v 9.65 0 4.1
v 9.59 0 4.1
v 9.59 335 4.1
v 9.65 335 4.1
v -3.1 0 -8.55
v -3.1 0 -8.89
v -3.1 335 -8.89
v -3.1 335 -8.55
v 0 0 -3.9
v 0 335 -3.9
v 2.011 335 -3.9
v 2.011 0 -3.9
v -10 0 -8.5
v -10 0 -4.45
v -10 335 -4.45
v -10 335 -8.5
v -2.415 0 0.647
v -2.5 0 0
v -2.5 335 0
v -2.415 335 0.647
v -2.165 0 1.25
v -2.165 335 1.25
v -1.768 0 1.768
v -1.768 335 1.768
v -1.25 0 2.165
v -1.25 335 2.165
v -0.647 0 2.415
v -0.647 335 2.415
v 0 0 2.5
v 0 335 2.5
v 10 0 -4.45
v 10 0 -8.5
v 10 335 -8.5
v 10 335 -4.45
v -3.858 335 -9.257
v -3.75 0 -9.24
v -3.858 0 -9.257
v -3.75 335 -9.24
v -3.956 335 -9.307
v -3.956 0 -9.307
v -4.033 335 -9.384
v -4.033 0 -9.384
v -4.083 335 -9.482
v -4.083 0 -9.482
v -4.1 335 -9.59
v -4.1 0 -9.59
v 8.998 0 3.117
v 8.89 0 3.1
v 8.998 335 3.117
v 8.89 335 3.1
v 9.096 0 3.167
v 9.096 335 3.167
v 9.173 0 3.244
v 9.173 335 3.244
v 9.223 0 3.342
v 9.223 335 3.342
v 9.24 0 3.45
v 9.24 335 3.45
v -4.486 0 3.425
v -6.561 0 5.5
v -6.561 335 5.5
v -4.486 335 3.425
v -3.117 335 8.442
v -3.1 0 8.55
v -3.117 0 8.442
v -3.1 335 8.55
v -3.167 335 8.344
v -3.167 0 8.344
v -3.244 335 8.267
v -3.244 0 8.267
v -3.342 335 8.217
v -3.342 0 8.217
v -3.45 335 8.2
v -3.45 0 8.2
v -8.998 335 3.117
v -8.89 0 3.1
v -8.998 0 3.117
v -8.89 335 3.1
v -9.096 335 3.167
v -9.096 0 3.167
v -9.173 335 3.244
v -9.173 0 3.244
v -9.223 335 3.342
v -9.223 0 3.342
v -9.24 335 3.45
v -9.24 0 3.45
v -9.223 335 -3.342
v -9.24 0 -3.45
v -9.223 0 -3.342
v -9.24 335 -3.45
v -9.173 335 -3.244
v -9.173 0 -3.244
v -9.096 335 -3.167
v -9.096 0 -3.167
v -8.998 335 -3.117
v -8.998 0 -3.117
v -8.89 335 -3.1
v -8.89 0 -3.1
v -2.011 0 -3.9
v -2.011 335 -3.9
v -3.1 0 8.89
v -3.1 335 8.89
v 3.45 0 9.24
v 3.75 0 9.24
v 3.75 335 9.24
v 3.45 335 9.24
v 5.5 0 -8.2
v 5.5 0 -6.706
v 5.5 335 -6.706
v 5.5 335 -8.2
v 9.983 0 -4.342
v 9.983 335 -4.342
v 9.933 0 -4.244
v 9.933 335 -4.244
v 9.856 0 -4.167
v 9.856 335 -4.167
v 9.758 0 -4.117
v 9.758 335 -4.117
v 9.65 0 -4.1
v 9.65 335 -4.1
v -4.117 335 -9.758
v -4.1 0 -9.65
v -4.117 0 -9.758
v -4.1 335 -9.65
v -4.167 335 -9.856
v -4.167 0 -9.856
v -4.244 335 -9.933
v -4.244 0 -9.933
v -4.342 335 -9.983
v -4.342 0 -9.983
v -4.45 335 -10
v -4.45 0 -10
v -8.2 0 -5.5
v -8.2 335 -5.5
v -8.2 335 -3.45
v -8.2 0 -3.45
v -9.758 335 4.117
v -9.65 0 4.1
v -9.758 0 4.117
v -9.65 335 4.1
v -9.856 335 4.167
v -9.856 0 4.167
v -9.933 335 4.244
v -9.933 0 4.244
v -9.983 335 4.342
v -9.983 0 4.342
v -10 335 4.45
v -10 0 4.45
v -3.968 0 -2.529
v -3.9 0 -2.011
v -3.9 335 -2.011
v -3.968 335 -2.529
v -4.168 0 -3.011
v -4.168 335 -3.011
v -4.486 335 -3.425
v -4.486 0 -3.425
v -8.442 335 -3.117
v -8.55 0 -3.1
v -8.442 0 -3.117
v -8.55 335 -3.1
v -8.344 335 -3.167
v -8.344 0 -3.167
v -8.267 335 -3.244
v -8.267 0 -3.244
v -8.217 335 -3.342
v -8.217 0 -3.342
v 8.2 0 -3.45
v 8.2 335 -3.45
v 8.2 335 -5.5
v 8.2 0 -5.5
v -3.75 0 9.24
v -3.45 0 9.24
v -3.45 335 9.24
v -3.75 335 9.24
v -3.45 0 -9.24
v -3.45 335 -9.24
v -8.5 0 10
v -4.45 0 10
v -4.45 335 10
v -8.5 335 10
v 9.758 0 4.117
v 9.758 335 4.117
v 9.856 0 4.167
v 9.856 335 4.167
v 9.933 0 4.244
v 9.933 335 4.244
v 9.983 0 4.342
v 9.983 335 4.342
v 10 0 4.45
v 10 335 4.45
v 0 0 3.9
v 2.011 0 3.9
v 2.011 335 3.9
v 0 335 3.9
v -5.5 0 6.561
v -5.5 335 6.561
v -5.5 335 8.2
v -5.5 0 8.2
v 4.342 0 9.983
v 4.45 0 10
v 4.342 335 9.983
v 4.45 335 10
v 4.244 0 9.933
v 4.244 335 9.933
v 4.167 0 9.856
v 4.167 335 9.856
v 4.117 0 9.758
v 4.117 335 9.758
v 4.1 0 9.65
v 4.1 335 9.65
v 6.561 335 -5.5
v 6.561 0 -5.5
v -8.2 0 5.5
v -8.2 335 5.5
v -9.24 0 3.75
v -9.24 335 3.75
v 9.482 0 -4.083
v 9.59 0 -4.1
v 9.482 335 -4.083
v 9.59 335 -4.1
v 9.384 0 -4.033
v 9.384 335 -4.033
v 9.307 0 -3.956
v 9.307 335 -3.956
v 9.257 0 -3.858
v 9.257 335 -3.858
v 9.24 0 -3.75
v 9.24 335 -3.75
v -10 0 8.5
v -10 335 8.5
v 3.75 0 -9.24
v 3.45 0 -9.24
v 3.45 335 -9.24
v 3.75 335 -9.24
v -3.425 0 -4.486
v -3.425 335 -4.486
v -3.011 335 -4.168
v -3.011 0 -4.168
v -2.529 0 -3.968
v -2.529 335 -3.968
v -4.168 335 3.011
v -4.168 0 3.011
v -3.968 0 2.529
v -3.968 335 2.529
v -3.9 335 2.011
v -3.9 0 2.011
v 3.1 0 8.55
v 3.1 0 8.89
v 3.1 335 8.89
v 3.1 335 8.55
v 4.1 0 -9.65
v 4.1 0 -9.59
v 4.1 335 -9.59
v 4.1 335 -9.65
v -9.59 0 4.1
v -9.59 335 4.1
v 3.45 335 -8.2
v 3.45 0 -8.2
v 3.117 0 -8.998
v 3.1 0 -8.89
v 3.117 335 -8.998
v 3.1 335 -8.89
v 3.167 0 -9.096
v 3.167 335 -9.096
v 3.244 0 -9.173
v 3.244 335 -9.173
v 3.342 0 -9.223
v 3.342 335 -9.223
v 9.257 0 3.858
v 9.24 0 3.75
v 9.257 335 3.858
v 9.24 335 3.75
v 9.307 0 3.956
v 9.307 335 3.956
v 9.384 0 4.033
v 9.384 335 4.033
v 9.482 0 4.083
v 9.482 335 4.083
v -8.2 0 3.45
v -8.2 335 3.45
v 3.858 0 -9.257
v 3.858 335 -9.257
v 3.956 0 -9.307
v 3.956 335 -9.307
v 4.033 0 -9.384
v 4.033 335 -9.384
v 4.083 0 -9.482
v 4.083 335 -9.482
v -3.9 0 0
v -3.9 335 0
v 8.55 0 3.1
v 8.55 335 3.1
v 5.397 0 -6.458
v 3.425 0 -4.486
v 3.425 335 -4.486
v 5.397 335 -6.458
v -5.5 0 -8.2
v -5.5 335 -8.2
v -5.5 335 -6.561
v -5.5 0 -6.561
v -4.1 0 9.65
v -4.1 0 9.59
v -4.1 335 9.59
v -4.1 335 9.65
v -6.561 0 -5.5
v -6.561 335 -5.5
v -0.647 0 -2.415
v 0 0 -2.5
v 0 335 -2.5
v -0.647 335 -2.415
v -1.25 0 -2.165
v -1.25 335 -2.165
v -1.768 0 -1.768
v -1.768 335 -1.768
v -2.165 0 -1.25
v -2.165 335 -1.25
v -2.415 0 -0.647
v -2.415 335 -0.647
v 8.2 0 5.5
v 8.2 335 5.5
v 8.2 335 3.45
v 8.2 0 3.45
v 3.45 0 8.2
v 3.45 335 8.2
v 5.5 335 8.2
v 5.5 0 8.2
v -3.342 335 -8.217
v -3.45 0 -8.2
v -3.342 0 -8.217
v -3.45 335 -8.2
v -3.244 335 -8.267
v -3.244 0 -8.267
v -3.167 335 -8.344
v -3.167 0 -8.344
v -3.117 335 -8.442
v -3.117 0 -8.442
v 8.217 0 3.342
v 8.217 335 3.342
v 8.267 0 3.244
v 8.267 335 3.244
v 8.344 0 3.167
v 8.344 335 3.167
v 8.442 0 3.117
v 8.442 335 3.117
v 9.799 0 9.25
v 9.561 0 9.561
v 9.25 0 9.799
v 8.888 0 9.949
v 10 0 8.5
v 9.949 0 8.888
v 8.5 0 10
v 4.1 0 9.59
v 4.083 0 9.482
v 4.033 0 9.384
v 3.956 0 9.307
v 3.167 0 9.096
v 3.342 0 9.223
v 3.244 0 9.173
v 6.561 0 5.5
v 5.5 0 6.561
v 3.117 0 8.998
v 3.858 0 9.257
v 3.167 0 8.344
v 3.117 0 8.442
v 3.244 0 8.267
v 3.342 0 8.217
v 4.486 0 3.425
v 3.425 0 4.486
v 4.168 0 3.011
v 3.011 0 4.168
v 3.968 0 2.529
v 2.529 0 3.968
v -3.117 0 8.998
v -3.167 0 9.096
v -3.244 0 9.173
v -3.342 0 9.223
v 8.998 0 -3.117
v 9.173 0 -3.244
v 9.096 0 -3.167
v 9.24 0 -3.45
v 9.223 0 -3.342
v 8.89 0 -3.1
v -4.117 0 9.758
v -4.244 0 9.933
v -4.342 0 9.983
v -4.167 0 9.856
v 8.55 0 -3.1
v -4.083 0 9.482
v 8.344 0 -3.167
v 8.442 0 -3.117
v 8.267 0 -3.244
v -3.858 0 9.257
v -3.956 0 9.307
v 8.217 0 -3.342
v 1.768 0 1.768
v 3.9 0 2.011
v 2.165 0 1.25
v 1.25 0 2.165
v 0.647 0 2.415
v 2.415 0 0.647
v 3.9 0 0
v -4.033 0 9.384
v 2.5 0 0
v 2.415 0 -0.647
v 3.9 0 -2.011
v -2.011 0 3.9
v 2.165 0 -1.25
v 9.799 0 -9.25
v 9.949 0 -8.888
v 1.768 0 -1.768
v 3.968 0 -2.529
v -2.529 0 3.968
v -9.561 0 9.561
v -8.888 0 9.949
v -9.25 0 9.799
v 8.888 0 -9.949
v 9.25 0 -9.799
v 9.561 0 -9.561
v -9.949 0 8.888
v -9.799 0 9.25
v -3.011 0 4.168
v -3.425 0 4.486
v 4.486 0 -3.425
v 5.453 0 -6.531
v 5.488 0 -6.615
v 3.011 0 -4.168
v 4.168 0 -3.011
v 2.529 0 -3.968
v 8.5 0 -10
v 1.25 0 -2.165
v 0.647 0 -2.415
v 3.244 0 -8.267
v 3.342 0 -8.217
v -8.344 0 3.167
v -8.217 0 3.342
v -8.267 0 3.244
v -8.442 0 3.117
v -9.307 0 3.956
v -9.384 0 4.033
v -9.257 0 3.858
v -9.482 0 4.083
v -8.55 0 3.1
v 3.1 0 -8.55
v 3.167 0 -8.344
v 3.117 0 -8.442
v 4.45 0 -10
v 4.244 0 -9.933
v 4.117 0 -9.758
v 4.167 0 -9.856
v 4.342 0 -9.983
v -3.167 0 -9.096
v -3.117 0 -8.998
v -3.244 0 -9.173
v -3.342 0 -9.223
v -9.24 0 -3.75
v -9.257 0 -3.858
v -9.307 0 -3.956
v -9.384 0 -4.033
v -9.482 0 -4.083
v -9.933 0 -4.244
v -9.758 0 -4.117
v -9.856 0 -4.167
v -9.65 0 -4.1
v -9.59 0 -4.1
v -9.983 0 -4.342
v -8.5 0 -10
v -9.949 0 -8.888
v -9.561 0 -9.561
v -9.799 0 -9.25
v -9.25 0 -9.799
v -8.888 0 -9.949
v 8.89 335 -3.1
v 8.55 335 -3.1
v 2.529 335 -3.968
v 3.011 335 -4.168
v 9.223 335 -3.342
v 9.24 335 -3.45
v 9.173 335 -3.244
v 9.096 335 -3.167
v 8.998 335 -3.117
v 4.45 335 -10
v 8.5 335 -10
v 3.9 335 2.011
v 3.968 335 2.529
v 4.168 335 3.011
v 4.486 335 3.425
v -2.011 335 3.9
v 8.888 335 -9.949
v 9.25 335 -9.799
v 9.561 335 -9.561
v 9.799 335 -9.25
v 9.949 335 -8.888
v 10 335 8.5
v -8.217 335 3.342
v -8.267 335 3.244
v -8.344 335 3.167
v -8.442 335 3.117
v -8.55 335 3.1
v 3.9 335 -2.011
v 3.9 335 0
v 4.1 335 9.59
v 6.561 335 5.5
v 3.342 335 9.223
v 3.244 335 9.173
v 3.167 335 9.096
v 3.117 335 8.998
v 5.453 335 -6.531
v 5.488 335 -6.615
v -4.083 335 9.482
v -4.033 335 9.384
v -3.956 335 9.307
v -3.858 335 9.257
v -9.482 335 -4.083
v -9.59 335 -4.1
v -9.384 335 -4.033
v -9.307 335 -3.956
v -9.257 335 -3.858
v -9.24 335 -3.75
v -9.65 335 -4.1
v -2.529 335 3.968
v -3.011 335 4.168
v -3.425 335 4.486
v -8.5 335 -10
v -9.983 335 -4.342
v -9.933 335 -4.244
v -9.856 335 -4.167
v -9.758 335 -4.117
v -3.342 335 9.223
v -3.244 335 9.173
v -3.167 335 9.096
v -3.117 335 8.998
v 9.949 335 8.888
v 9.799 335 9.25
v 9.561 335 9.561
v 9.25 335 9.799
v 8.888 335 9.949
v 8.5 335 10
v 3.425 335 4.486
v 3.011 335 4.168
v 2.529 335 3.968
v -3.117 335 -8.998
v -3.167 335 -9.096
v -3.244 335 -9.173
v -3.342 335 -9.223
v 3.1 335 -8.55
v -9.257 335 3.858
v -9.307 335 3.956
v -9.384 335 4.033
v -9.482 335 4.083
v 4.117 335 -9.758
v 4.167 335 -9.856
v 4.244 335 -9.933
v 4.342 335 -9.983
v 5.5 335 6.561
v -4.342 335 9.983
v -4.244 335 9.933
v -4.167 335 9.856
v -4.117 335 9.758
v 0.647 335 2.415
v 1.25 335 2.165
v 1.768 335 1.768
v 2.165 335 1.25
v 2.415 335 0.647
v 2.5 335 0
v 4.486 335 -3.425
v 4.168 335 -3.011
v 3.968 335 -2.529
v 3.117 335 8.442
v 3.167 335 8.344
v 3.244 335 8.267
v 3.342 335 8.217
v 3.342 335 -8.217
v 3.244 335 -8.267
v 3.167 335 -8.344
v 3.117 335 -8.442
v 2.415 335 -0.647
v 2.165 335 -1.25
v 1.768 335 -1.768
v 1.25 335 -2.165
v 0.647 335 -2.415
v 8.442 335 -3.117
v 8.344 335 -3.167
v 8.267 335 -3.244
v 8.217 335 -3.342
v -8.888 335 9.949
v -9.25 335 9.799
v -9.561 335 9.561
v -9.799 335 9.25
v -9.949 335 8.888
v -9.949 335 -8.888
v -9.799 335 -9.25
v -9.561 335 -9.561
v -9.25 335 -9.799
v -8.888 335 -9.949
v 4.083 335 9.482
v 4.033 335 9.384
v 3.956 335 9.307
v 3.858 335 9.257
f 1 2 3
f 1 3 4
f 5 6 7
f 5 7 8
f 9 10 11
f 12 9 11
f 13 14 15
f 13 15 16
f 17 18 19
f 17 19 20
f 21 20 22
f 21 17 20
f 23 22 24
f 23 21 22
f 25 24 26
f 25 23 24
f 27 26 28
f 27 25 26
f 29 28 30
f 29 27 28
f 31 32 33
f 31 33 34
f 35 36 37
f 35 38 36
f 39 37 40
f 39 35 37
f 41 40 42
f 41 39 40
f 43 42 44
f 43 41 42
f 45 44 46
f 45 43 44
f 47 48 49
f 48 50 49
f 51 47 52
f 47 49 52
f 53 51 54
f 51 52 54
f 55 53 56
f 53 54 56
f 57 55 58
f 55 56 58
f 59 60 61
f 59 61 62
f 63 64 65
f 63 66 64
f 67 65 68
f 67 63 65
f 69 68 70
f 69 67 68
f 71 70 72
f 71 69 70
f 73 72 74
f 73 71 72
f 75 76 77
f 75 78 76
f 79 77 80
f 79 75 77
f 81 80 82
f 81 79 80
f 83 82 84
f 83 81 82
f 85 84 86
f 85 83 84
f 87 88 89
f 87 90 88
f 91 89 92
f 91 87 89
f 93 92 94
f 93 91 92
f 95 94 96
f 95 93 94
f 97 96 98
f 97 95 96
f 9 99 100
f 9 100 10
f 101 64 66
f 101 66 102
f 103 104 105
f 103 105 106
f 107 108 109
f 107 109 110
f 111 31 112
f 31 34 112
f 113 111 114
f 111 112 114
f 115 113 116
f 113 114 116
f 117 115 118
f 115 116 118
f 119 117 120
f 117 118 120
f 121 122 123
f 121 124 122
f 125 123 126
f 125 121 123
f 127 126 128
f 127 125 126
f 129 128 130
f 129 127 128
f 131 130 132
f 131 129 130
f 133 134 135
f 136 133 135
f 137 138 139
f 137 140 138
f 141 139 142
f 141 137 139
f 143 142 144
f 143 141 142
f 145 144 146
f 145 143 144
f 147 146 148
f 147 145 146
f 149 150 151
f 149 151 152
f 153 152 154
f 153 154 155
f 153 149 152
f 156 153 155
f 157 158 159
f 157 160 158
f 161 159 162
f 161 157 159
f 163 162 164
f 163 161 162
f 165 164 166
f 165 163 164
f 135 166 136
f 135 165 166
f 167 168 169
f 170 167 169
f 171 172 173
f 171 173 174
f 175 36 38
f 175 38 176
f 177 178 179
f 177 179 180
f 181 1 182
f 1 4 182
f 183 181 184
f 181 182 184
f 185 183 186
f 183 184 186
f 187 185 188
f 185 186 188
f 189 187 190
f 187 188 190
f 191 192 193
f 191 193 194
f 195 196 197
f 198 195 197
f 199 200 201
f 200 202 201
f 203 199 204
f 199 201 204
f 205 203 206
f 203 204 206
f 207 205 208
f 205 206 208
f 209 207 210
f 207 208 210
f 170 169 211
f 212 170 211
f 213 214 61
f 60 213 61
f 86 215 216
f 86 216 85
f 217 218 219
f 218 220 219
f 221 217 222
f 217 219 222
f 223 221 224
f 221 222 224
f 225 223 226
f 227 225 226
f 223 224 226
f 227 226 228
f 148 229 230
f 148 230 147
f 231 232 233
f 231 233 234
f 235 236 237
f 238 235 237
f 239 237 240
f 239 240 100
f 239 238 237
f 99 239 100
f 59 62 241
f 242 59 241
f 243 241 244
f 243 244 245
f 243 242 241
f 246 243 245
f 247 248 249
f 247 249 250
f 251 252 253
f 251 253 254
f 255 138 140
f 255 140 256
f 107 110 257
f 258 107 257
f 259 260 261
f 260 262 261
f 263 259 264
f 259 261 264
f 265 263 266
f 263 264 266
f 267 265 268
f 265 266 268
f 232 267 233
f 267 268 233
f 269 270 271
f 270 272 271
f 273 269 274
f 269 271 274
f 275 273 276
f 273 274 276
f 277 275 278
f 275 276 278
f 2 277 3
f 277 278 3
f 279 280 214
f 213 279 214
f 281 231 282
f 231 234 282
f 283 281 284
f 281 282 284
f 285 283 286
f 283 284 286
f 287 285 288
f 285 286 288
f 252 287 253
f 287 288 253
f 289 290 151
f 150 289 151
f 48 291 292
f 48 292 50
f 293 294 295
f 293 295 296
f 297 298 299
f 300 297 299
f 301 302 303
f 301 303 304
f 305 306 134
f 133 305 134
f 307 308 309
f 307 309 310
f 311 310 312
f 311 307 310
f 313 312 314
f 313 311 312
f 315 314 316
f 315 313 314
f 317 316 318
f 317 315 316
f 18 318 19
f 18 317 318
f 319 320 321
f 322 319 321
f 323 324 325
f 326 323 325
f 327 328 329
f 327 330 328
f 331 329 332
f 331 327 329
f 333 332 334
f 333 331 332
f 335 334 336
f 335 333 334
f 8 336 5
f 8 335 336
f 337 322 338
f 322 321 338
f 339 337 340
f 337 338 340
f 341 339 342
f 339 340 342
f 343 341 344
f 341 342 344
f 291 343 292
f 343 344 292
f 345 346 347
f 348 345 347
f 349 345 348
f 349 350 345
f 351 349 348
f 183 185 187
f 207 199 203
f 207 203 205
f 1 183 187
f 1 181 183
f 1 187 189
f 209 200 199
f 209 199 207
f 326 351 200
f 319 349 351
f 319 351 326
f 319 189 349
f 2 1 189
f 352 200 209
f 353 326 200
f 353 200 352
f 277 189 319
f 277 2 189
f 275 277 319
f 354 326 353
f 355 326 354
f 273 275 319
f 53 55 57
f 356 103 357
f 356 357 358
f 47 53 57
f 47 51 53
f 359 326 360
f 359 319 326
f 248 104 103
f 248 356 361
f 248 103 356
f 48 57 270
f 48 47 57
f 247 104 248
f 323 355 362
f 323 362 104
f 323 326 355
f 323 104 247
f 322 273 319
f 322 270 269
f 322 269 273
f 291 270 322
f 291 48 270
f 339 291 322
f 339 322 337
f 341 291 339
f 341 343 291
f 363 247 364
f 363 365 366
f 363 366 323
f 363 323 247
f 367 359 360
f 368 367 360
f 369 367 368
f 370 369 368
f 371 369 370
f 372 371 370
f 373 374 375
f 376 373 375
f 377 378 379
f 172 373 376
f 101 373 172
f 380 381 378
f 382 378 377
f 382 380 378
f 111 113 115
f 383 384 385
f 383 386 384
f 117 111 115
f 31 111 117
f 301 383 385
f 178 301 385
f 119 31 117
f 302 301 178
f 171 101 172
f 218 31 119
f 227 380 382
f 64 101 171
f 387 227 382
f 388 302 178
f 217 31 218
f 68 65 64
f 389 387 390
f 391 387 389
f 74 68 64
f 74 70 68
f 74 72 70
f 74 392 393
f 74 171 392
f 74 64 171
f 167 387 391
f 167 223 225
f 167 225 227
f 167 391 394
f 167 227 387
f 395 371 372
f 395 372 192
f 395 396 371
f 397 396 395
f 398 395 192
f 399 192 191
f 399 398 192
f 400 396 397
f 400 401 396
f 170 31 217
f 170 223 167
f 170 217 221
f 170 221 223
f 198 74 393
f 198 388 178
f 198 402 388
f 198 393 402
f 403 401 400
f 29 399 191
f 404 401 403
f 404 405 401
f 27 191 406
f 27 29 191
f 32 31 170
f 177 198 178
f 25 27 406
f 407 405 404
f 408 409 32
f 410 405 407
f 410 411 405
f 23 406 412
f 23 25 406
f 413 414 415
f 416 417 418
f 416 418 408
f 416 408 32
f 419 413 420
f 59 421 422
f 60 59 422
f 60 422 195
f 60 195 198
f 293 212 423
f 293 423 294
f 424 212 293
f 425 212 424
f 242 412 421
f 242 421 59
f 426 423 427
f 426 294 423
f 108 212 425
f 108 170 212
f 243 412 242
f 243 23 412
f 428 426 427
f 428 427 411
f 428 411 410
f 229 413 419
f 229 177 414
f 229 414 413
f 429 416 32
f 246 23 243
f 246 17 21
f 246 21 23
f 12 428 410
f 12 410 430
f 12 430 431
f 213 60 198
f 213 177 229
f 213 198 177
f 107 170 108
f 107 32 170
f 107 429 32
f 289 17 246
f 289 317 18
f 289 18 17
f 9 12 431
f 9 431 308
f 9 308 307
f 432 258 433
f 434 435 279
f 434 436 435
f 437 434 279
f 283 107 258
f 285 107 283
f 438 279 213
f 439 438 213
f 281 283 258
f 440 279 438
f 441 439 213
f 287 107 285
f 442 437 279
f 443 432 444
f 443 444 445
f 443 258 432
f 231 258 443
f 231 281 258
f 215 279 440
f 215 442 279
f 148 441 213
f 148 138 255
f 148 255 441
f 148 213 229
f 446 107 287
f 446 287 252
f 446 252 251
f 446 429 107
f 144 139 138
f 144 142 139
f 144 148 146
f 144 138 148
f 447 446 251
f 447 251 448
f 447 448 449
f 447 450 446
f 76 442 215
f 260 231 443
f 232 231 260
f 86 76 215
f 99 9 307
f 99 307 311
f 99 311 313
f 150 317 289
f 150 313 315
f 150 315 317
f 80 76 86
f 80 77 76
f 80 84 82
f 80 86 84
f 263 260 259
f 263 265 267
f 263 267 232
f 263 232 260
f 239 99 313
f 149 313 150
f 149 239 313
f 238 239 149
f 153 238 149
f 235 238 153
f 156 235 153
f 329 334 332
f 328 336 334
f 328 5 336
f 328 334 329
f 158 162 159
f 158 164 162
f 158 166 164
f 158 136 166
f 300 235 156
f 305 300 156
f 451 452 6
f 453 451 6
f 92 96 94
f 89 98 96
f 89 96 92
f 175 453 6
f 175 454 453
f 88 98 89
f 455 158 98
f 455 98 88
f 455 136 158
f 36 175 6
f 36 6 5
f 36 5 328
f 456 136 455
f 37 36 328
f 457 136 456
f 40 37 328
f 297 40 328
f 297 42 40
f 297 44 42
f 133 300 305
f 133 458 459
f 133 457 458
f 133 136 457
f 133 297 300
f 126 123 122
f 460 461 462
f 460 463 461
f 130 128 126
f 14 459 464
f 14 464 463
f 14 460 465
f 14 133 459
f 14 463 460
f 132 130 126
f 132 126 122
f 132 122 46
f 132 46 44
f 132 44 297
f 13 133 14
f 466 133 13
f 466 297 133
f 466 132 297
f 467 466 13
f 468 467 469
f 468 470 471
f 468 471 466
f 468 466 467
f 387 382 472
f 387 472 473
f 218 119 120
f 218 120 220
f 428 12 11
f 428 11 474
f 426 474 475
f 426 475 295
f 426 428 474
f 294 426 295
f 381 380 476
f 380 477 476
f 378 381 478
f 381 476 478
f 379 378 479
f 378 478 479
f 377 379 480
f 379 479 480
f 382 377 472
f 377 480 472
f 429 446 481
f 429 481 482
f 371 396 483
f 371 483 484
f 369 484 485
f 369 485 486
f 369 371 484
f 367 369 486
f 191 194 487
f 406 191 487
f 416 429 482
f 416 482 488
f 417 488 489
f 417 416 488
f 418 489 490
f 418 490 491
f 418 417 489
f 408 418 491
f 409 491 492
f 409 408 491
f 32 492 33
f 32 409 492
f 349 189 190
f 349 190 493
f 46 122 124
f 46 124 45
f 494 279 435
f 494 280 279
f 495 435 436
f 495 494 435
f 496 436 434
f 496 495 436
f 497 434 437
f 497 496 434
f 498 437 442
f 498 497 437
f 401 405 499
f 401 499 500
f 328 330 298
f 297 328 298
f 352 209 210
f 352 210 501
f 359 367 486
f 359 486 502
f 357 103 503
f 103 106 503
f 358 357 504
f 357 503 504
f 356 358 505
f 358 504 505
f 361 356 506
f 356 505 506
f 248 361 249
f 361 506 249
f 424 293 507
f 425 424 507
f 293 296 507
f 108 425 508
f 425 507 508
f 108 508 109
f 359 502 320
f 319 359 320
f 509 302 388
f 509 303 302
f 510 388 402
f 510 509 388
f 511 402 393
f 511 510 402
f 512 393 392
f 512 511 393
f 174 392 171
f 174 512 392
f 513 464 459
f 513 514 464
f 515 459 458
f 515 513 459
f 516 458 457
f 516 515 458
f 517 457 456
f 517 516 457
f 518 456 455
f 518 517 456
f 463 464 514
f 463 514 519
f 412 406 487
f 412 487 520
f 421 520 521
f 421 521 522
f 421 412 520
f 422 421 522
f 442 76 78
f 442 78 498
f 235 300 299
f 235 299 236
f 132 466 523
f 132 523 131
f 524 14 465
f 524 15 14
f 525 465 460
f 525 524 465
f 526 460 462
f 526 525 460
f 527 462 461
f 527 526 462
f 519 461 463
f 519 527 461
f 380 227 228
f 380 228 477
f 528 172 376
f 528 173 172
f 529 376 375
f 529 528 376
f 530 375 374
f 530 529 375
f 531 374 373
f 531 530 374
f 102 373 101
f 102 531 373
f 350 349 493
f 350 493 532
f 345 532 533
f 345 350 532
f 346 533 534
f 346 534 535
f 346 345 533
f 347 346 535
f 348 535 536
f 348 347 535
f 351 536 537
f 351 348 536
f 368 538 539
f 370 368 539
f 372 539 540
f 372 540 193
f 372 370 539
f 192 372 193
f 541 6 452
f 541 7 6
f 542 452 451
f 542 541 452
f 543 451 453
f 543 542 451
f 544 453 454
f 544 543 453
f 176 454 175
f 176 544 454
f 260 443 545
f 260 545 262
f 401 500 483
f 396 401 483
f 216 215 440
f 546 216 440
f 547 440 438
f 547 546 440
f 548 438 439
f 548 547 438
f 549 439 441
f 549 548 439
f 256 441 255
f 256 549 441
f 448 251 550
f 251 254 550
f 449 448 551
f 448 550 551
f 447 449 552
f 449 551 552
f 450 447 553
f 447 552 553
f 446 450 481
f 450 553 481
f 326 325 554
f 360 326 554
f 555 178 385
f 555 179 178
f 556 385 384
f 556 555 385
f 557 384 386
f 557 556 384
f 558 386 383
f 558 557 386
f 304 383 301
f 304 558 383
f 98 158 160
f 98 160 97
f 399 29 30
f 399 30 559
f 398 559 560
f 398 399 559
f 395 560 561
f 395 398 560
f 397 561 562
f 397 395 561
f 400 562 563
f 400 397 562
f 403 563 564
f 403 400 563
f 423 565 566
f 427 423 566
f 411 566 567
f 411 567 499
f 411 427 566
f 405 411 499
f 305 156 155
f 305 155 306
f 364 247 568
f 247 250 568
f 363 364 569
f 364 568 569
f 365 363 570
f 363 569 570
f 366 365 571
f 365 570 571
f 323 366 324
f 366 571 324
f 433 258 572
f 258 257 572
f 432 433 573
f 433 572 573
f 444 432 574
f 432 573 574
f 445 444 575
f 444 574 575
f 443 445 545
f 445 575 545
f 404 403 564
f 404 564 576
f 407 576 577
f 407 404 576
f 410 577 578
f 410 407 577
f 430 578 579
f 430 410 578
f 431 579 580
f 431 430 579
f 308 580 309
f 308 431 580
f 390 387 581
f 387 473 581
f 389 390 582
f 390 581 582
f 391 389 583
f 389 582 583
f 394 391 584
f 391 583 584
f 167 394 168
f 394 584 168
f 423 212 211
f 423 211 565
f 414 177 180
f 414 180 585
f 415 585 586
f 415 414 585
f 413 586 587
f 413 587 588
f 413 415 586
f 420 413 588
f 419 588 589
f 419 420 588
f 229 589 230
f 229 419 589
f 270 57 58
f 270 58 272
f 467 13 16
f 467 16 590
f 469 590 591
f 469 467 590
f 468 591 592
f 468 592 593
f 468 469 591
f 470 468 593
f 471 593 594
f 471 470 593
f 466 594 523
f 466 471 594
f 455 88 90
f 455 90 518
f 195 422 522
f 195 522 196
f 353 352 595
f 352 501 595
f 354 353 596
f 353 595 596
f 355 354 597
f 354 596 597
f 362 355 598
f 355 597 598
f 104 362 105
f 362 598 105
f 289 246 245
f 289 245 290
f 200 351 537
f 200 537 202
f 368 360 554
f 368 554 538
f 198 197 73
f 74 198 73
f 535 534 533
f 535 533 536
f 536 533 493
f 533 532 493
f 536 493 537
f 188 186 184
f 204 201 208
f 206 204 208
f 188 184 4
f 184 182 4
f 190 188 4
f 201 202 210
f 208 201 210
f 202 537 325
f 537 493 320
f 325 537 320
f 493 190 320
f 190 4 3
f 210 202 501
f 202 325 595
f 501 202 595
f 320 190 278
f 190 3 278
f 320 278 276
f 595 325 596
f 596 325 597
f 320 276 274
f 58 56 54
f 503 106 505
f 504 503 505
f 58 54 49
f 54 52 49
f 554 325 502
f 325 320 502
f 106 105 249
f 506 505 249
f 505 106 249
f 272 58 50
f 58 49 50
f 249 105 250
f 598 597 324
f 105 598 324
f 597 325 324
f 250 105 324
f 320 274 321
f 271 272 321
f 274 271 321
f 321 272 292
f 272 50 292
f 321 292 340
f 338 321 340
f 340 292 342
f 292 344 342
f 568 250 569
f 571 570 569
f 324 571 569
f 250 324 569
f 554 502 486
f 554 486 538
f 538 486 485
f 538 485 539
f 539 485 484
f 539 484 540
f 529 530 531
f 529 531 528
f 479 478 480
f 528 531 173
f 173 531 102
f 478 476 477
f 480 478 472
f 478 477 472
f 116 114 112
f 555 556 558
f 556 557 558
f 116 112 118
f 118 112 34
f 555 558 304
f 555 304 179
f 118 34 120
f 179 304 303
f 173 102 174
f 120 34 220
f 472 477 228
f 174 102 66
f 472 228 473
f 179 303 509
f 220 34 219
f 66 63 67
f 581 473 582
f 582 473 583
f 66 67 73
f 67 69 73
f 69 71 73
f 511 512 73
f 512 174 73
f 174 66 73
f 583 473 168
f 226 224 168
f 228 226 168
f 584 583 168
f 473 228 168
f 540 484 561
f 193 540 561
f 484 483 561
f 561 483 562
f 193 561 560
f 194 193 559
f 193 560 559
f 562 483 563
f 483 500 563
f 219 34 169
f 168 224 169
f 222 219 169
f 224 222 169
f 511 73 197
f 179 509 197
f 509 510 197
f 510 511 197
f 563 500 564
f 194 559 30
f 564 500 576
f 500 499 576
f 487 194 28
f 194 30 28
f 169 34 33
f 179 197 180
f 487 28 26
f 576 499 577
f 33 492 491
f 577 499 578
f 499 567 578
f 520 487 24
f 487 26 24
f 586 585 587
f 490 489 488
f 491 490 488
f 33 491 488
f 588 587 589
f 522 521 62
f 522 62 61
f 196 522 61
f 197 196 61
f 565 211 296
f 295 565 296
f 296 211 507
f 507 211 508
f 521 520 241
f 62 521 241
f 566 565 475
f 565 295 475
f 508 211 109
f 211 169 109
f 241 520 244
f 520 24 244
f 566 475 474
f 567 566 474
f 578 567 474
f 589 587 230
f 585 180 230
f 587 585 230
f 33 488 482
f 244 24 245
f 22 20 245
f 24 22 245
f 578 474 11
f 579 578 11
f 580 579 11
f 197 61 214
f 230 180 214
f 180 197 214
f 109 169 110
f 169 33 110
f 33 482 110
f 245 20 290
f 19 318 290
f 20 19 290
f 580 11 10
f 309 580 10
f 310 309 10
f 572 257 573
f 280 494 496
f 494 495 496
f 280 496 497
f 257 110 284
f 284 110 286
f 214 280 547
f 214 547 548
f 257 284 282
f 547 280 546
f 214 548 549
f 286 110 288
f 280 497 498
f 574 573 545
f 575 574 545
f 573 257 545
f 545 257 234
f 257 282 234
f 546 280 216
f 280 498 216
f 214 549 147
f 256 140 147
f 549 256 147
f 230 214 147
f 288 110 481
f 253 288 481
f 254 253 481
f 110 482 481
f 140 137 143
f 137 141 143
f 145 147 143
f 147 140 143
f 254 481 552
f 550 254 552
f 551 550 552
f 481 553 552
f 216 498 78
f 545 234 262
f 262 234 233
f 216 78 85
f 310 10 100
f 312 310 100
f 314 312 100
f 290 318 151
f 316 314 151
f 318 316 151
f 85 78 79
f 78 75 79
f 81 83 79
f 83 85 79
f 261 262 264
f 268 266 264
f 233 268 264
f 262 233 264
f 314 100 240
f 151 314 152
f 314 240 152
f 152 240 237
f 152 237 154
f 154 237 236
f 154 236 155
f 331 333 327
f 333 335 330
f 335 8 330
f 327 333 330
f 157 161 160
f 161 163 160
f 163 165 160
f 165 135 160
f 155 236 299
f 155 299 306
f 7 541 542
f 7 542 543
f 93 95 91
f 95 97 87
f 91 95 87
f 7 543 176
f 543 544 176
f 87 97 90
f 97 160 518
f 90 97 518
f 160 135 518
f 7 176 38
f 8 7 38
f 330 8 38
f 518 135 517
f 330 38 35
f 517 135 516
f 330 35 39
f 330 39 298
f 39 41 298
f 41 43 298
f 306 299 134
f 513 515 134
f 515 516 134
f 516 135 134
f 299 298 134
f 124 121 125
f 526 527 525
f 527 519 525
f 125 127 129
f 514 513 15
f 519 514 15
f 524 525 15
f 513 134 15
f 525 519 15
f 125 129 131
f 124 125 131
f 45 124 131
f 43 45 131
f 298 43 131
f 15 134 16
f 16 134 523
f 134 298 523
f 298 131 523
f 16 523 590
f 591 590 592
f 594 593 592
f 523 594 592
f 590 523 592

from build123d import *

# Parameters (mm, degrees)
BOSS_EXTRUDE1_DEPTH = 335
FILLET1_R           = 0.35


with BuildPart() as part:
    # Sketch1 → Boss-Extrude1 (new body)
    with BuildSketch(Plane(origin=(0, 0, 0), x_dir=(1, 0, 0), z_dir=(0, 1, 0))):
        with BuildLine():
            Line((3.425126266, 4.485786438), (5.5, 6.560660172))
            Line((5.5, 6.560660172), (5.5, 8.2))
            Line((5.5, 8.2), (3.1, 8.2))
            Line((3.1, 8.2), (3.1, 9.24))
            Line((3.1, 9.24), (4.1, 9.24))
            Line((4.1, 9.24), (4.1, 10))
            Line((4.1, 10), (8.5, 10))
            ThreePointArc((8.5, 10), (9.560660172, 9.560660172), (10, 8.5))
            Line((10, 8.5), (10, 4.1))
            Line((10, 4.1), (9.24, 4.1))
            Line((9.24, 4.1), (9.24, 3.1))
            Line((9.24, 3.1), (8.2, 3.1))
            Line((8.2, 3.1), (8.2, 5.5))
            Line((8.2, 5.5), (6.560660172, 5.5))
            Line((6.560660172, 5.5), (4.485786359, 3.425126187))
            ThreePointArc((4.485786359, 3.425126187), (4.052240856, 2.77627949), (3.899999921, 2.010912625))
            Line((3.899999921, 2.010912625), (3.899999921, 0))
            Line((3.899999921, 0), (3.9, -2.010912703))
            ThreePointArc((3.9, -2.010912703), (4.052240935, -2.776279568), (4.485786438, -3.425126266))
            Line((4.485786438, -3.425126266), (6.560660172, -5.5))
            Line((6.560660172, -5.5), (8.2, -5.5))
            Line((8.2, -5.5), (8.2, -3.1))
            Line((8.2, -3.1), (9.24, -3.1))
            Line((9.24, -3.1), (9.24, -4.1))
            Line((9.24, -4.1), (10, -4.1))
            Line((10, -4.1), (10, -8.5))
            ThreePointArc((10, -8.5), (9.560660172, -9.560660172), (8.5, -10))
            Line((8.5, -10), (4.1, -10))
            Line((4.1, -10), (4.1, -9.24))
            Line((4.1, -9.24), (3.1, -9.24))
            Line((3.1, -9.24), (3.1, -8.2))
            Line((3.1, -8.2), (5.5, -8.2))
            Line((5.5, -8.2), (5.5, -6.560660172))
            Line((5.5, -6.560660172), (3.425126187, -4.485786359))
            ThreePointArc((3.425126187, -4.485786359), (2.77627949, -4.052240856), (2.010912625, -3.899999921))
            Line((2.010912625, -3.899999921), (0, -3.899999921))
            Line((0, -3.899999921), (-2.010912703, -3.9))
            ThreePointArc((-2.010912703, -3.9), (-2.776279568, -4.052240935), (-3.425126266, -4.485786438))
            Line((-3.425126266, -4.485786438), (-5.5, -6.560660172))
            Line((-5.5, -6.560660172), (-5.5, -8.2))
            Line((-5.5, -8.2), (-3.1, -8.2))
            Line((-3.1, -8.2), (-3.1, -9.24))
            Line((-3.1, -9.24), (-4.1, -9.24))
            Line((-4.1, -9.24), (-4.1, -10))
            Line((-4.1, -10), (-8.5, -10))
            ThreePointArc((-8.5, -10), (-9.560660172, -9.560660172), (-10, -8.5))
            Line((-10, -8.5), (-10, -4.1))
            Line((-10, -4.1), (-9.24, -4.1))
            Line((-9.24, -4.1), (-9.24, -3.1))
            Line((-9.24, -3.1), (-8.2, -3.1))
            Line((-8.2, -3.1), (-8.2, -5.5))
            Line((-8.2, -5.5), (-6.560660172, -5.5))
            Line((-6.560660172, -5.5), (-4.485786359, -3.425126187))
            ThreePointArc((-4.485786359, -3.425126187), (-4.052240856, -2.77627949), (-3.899999921, -2.010912625))
            Line((-3.899999921, -2.010912625), (-3.899999921, 0))
            Line((-3.899999921, 0), (-3.9, 2.010912703))
            ThreePointArc((-3.9, 2.010912703), (-4.052240935, 2.776279568), (-4.485786438, 3.425126266))
            Line((-4.485786438, 3.425126266), (-6.560660172, 5.5))
            Line((-6.560660172, 5.5), (-8.2, 5.5))
            Line((-8.2, 5.5), (-8.2, 3.1))
            Line((-8.2, 3.1), (-9.24, 3.1))
            Line((-9.24, 3.1), (-9.24, 4.1))
            Line((-9.24, 4.1), (-10, 4.1))
            Line((-10, 4.1), (-10, 8.5))
            ThreePointArc((-10, 8.5), (-9.560660172, 9.560660172), (-8.5, 10))
            Line((-8.5, 10), (-4.1, 10))
            Line((-4.1, 10), (-4.1, 9.24))
            Line((-4.1, 9.24), (-3.1, 9.24))
            Line((-3.1, 9.24), (-3.1, 8.2))
            Line((-3.1, 8.2), (-5.5, 8.2))
            Line((-5.5, 8.2), (-5.5, 6.560660172))
            Line((-5.5, 6.560660172), (-3.425126187, 4.485786359))
            ThreePointArc((-3.425126187, 4.485786359), (-2.77627949, 4.052240856), (-2.010912625, 3.899999921))
            Line((-2.010912625, 3.899999921), (0, 3.9))
            Line((0, 3.9), (2.010912703, 3.9))
            ThreePointArc((2.010912703, 3.9), (2.776279568, 4.052240935), (3.425126266, 4.485786438))
        make_face()
        with BuildLine():
            ThreePointArc((2.5, 0), (1.767766953, 1.767766953), (0, 2.5))
            ThreePointArc((0, 2.5), (-1.767766953, 1.767766953), (-2.5, 0))
            ThreePointArc((-2.5, 0), (-1.767766953, -1.767766953), (0, -2.5))
            ThreePointArc((0, -2.5), (1.767766953, -1.767766953), (2.5, 0))
        make_face(mode=Mode.SUBTRACT)
    extrude(amount=BOSS_EXTRUDE1_DEPTH)

    # Fillet1
    fillet1_edges = [part.edges().sort_by_distance(p)[0] for p in [
        (5.5, 167.5, -6.560660172),
        (3.1, 167.5, -8.2),
        (3.1, 167.5, -9.24),
        (4.1, 167.5, -9.24),
        (4.1, 167.5, -10),
        (10, 167.5, -4.1),
        (9.24, 167.5, -4.1),
        (9.24, 167.5, -3.1),
        (8.2, 167.5, -3.1),
        (8.2, 167.5, 3.1),
        (9.24, 167.5, 3.1),
        (9.24, 167.5, 4.1),
        (10, 167.5, 4.1),
        (4.1, 167.5, 10),
        (4.1, 167.5, 9.24),
        (3.1, 167.5, 9.24),
        (3.1, 167.5, 8.2),
        (-3.1, 167.5, 8.2),
        (-3.1, 167.5, 9.24),
        (-4.1, 167.5, 9.24),
        (-4.1, 167.5, 10),
        (-10, 167.5, 4.1),
        (-9.24, 167.5, 4.1),
        (-9.24, 167.5, 3.1),
        (-8.2, 167.5, 3.1),
        (-8.2, 167.5, -3.1),
        (-9.24, 167.5, -3.1),
        (-9.24, 167.5, -4.1),
        (-10, 167.5, -4.1),
        (-4.1, 167.5, -10),
        (-4.1, 167.5, -9.24),
        (-3.1, 167.5, -9.24),
        (-3.1, 167.5, -8.2),
    ]]
    fillet(fillet1_edges, radius=FILLET1_R)


solid = part.part
